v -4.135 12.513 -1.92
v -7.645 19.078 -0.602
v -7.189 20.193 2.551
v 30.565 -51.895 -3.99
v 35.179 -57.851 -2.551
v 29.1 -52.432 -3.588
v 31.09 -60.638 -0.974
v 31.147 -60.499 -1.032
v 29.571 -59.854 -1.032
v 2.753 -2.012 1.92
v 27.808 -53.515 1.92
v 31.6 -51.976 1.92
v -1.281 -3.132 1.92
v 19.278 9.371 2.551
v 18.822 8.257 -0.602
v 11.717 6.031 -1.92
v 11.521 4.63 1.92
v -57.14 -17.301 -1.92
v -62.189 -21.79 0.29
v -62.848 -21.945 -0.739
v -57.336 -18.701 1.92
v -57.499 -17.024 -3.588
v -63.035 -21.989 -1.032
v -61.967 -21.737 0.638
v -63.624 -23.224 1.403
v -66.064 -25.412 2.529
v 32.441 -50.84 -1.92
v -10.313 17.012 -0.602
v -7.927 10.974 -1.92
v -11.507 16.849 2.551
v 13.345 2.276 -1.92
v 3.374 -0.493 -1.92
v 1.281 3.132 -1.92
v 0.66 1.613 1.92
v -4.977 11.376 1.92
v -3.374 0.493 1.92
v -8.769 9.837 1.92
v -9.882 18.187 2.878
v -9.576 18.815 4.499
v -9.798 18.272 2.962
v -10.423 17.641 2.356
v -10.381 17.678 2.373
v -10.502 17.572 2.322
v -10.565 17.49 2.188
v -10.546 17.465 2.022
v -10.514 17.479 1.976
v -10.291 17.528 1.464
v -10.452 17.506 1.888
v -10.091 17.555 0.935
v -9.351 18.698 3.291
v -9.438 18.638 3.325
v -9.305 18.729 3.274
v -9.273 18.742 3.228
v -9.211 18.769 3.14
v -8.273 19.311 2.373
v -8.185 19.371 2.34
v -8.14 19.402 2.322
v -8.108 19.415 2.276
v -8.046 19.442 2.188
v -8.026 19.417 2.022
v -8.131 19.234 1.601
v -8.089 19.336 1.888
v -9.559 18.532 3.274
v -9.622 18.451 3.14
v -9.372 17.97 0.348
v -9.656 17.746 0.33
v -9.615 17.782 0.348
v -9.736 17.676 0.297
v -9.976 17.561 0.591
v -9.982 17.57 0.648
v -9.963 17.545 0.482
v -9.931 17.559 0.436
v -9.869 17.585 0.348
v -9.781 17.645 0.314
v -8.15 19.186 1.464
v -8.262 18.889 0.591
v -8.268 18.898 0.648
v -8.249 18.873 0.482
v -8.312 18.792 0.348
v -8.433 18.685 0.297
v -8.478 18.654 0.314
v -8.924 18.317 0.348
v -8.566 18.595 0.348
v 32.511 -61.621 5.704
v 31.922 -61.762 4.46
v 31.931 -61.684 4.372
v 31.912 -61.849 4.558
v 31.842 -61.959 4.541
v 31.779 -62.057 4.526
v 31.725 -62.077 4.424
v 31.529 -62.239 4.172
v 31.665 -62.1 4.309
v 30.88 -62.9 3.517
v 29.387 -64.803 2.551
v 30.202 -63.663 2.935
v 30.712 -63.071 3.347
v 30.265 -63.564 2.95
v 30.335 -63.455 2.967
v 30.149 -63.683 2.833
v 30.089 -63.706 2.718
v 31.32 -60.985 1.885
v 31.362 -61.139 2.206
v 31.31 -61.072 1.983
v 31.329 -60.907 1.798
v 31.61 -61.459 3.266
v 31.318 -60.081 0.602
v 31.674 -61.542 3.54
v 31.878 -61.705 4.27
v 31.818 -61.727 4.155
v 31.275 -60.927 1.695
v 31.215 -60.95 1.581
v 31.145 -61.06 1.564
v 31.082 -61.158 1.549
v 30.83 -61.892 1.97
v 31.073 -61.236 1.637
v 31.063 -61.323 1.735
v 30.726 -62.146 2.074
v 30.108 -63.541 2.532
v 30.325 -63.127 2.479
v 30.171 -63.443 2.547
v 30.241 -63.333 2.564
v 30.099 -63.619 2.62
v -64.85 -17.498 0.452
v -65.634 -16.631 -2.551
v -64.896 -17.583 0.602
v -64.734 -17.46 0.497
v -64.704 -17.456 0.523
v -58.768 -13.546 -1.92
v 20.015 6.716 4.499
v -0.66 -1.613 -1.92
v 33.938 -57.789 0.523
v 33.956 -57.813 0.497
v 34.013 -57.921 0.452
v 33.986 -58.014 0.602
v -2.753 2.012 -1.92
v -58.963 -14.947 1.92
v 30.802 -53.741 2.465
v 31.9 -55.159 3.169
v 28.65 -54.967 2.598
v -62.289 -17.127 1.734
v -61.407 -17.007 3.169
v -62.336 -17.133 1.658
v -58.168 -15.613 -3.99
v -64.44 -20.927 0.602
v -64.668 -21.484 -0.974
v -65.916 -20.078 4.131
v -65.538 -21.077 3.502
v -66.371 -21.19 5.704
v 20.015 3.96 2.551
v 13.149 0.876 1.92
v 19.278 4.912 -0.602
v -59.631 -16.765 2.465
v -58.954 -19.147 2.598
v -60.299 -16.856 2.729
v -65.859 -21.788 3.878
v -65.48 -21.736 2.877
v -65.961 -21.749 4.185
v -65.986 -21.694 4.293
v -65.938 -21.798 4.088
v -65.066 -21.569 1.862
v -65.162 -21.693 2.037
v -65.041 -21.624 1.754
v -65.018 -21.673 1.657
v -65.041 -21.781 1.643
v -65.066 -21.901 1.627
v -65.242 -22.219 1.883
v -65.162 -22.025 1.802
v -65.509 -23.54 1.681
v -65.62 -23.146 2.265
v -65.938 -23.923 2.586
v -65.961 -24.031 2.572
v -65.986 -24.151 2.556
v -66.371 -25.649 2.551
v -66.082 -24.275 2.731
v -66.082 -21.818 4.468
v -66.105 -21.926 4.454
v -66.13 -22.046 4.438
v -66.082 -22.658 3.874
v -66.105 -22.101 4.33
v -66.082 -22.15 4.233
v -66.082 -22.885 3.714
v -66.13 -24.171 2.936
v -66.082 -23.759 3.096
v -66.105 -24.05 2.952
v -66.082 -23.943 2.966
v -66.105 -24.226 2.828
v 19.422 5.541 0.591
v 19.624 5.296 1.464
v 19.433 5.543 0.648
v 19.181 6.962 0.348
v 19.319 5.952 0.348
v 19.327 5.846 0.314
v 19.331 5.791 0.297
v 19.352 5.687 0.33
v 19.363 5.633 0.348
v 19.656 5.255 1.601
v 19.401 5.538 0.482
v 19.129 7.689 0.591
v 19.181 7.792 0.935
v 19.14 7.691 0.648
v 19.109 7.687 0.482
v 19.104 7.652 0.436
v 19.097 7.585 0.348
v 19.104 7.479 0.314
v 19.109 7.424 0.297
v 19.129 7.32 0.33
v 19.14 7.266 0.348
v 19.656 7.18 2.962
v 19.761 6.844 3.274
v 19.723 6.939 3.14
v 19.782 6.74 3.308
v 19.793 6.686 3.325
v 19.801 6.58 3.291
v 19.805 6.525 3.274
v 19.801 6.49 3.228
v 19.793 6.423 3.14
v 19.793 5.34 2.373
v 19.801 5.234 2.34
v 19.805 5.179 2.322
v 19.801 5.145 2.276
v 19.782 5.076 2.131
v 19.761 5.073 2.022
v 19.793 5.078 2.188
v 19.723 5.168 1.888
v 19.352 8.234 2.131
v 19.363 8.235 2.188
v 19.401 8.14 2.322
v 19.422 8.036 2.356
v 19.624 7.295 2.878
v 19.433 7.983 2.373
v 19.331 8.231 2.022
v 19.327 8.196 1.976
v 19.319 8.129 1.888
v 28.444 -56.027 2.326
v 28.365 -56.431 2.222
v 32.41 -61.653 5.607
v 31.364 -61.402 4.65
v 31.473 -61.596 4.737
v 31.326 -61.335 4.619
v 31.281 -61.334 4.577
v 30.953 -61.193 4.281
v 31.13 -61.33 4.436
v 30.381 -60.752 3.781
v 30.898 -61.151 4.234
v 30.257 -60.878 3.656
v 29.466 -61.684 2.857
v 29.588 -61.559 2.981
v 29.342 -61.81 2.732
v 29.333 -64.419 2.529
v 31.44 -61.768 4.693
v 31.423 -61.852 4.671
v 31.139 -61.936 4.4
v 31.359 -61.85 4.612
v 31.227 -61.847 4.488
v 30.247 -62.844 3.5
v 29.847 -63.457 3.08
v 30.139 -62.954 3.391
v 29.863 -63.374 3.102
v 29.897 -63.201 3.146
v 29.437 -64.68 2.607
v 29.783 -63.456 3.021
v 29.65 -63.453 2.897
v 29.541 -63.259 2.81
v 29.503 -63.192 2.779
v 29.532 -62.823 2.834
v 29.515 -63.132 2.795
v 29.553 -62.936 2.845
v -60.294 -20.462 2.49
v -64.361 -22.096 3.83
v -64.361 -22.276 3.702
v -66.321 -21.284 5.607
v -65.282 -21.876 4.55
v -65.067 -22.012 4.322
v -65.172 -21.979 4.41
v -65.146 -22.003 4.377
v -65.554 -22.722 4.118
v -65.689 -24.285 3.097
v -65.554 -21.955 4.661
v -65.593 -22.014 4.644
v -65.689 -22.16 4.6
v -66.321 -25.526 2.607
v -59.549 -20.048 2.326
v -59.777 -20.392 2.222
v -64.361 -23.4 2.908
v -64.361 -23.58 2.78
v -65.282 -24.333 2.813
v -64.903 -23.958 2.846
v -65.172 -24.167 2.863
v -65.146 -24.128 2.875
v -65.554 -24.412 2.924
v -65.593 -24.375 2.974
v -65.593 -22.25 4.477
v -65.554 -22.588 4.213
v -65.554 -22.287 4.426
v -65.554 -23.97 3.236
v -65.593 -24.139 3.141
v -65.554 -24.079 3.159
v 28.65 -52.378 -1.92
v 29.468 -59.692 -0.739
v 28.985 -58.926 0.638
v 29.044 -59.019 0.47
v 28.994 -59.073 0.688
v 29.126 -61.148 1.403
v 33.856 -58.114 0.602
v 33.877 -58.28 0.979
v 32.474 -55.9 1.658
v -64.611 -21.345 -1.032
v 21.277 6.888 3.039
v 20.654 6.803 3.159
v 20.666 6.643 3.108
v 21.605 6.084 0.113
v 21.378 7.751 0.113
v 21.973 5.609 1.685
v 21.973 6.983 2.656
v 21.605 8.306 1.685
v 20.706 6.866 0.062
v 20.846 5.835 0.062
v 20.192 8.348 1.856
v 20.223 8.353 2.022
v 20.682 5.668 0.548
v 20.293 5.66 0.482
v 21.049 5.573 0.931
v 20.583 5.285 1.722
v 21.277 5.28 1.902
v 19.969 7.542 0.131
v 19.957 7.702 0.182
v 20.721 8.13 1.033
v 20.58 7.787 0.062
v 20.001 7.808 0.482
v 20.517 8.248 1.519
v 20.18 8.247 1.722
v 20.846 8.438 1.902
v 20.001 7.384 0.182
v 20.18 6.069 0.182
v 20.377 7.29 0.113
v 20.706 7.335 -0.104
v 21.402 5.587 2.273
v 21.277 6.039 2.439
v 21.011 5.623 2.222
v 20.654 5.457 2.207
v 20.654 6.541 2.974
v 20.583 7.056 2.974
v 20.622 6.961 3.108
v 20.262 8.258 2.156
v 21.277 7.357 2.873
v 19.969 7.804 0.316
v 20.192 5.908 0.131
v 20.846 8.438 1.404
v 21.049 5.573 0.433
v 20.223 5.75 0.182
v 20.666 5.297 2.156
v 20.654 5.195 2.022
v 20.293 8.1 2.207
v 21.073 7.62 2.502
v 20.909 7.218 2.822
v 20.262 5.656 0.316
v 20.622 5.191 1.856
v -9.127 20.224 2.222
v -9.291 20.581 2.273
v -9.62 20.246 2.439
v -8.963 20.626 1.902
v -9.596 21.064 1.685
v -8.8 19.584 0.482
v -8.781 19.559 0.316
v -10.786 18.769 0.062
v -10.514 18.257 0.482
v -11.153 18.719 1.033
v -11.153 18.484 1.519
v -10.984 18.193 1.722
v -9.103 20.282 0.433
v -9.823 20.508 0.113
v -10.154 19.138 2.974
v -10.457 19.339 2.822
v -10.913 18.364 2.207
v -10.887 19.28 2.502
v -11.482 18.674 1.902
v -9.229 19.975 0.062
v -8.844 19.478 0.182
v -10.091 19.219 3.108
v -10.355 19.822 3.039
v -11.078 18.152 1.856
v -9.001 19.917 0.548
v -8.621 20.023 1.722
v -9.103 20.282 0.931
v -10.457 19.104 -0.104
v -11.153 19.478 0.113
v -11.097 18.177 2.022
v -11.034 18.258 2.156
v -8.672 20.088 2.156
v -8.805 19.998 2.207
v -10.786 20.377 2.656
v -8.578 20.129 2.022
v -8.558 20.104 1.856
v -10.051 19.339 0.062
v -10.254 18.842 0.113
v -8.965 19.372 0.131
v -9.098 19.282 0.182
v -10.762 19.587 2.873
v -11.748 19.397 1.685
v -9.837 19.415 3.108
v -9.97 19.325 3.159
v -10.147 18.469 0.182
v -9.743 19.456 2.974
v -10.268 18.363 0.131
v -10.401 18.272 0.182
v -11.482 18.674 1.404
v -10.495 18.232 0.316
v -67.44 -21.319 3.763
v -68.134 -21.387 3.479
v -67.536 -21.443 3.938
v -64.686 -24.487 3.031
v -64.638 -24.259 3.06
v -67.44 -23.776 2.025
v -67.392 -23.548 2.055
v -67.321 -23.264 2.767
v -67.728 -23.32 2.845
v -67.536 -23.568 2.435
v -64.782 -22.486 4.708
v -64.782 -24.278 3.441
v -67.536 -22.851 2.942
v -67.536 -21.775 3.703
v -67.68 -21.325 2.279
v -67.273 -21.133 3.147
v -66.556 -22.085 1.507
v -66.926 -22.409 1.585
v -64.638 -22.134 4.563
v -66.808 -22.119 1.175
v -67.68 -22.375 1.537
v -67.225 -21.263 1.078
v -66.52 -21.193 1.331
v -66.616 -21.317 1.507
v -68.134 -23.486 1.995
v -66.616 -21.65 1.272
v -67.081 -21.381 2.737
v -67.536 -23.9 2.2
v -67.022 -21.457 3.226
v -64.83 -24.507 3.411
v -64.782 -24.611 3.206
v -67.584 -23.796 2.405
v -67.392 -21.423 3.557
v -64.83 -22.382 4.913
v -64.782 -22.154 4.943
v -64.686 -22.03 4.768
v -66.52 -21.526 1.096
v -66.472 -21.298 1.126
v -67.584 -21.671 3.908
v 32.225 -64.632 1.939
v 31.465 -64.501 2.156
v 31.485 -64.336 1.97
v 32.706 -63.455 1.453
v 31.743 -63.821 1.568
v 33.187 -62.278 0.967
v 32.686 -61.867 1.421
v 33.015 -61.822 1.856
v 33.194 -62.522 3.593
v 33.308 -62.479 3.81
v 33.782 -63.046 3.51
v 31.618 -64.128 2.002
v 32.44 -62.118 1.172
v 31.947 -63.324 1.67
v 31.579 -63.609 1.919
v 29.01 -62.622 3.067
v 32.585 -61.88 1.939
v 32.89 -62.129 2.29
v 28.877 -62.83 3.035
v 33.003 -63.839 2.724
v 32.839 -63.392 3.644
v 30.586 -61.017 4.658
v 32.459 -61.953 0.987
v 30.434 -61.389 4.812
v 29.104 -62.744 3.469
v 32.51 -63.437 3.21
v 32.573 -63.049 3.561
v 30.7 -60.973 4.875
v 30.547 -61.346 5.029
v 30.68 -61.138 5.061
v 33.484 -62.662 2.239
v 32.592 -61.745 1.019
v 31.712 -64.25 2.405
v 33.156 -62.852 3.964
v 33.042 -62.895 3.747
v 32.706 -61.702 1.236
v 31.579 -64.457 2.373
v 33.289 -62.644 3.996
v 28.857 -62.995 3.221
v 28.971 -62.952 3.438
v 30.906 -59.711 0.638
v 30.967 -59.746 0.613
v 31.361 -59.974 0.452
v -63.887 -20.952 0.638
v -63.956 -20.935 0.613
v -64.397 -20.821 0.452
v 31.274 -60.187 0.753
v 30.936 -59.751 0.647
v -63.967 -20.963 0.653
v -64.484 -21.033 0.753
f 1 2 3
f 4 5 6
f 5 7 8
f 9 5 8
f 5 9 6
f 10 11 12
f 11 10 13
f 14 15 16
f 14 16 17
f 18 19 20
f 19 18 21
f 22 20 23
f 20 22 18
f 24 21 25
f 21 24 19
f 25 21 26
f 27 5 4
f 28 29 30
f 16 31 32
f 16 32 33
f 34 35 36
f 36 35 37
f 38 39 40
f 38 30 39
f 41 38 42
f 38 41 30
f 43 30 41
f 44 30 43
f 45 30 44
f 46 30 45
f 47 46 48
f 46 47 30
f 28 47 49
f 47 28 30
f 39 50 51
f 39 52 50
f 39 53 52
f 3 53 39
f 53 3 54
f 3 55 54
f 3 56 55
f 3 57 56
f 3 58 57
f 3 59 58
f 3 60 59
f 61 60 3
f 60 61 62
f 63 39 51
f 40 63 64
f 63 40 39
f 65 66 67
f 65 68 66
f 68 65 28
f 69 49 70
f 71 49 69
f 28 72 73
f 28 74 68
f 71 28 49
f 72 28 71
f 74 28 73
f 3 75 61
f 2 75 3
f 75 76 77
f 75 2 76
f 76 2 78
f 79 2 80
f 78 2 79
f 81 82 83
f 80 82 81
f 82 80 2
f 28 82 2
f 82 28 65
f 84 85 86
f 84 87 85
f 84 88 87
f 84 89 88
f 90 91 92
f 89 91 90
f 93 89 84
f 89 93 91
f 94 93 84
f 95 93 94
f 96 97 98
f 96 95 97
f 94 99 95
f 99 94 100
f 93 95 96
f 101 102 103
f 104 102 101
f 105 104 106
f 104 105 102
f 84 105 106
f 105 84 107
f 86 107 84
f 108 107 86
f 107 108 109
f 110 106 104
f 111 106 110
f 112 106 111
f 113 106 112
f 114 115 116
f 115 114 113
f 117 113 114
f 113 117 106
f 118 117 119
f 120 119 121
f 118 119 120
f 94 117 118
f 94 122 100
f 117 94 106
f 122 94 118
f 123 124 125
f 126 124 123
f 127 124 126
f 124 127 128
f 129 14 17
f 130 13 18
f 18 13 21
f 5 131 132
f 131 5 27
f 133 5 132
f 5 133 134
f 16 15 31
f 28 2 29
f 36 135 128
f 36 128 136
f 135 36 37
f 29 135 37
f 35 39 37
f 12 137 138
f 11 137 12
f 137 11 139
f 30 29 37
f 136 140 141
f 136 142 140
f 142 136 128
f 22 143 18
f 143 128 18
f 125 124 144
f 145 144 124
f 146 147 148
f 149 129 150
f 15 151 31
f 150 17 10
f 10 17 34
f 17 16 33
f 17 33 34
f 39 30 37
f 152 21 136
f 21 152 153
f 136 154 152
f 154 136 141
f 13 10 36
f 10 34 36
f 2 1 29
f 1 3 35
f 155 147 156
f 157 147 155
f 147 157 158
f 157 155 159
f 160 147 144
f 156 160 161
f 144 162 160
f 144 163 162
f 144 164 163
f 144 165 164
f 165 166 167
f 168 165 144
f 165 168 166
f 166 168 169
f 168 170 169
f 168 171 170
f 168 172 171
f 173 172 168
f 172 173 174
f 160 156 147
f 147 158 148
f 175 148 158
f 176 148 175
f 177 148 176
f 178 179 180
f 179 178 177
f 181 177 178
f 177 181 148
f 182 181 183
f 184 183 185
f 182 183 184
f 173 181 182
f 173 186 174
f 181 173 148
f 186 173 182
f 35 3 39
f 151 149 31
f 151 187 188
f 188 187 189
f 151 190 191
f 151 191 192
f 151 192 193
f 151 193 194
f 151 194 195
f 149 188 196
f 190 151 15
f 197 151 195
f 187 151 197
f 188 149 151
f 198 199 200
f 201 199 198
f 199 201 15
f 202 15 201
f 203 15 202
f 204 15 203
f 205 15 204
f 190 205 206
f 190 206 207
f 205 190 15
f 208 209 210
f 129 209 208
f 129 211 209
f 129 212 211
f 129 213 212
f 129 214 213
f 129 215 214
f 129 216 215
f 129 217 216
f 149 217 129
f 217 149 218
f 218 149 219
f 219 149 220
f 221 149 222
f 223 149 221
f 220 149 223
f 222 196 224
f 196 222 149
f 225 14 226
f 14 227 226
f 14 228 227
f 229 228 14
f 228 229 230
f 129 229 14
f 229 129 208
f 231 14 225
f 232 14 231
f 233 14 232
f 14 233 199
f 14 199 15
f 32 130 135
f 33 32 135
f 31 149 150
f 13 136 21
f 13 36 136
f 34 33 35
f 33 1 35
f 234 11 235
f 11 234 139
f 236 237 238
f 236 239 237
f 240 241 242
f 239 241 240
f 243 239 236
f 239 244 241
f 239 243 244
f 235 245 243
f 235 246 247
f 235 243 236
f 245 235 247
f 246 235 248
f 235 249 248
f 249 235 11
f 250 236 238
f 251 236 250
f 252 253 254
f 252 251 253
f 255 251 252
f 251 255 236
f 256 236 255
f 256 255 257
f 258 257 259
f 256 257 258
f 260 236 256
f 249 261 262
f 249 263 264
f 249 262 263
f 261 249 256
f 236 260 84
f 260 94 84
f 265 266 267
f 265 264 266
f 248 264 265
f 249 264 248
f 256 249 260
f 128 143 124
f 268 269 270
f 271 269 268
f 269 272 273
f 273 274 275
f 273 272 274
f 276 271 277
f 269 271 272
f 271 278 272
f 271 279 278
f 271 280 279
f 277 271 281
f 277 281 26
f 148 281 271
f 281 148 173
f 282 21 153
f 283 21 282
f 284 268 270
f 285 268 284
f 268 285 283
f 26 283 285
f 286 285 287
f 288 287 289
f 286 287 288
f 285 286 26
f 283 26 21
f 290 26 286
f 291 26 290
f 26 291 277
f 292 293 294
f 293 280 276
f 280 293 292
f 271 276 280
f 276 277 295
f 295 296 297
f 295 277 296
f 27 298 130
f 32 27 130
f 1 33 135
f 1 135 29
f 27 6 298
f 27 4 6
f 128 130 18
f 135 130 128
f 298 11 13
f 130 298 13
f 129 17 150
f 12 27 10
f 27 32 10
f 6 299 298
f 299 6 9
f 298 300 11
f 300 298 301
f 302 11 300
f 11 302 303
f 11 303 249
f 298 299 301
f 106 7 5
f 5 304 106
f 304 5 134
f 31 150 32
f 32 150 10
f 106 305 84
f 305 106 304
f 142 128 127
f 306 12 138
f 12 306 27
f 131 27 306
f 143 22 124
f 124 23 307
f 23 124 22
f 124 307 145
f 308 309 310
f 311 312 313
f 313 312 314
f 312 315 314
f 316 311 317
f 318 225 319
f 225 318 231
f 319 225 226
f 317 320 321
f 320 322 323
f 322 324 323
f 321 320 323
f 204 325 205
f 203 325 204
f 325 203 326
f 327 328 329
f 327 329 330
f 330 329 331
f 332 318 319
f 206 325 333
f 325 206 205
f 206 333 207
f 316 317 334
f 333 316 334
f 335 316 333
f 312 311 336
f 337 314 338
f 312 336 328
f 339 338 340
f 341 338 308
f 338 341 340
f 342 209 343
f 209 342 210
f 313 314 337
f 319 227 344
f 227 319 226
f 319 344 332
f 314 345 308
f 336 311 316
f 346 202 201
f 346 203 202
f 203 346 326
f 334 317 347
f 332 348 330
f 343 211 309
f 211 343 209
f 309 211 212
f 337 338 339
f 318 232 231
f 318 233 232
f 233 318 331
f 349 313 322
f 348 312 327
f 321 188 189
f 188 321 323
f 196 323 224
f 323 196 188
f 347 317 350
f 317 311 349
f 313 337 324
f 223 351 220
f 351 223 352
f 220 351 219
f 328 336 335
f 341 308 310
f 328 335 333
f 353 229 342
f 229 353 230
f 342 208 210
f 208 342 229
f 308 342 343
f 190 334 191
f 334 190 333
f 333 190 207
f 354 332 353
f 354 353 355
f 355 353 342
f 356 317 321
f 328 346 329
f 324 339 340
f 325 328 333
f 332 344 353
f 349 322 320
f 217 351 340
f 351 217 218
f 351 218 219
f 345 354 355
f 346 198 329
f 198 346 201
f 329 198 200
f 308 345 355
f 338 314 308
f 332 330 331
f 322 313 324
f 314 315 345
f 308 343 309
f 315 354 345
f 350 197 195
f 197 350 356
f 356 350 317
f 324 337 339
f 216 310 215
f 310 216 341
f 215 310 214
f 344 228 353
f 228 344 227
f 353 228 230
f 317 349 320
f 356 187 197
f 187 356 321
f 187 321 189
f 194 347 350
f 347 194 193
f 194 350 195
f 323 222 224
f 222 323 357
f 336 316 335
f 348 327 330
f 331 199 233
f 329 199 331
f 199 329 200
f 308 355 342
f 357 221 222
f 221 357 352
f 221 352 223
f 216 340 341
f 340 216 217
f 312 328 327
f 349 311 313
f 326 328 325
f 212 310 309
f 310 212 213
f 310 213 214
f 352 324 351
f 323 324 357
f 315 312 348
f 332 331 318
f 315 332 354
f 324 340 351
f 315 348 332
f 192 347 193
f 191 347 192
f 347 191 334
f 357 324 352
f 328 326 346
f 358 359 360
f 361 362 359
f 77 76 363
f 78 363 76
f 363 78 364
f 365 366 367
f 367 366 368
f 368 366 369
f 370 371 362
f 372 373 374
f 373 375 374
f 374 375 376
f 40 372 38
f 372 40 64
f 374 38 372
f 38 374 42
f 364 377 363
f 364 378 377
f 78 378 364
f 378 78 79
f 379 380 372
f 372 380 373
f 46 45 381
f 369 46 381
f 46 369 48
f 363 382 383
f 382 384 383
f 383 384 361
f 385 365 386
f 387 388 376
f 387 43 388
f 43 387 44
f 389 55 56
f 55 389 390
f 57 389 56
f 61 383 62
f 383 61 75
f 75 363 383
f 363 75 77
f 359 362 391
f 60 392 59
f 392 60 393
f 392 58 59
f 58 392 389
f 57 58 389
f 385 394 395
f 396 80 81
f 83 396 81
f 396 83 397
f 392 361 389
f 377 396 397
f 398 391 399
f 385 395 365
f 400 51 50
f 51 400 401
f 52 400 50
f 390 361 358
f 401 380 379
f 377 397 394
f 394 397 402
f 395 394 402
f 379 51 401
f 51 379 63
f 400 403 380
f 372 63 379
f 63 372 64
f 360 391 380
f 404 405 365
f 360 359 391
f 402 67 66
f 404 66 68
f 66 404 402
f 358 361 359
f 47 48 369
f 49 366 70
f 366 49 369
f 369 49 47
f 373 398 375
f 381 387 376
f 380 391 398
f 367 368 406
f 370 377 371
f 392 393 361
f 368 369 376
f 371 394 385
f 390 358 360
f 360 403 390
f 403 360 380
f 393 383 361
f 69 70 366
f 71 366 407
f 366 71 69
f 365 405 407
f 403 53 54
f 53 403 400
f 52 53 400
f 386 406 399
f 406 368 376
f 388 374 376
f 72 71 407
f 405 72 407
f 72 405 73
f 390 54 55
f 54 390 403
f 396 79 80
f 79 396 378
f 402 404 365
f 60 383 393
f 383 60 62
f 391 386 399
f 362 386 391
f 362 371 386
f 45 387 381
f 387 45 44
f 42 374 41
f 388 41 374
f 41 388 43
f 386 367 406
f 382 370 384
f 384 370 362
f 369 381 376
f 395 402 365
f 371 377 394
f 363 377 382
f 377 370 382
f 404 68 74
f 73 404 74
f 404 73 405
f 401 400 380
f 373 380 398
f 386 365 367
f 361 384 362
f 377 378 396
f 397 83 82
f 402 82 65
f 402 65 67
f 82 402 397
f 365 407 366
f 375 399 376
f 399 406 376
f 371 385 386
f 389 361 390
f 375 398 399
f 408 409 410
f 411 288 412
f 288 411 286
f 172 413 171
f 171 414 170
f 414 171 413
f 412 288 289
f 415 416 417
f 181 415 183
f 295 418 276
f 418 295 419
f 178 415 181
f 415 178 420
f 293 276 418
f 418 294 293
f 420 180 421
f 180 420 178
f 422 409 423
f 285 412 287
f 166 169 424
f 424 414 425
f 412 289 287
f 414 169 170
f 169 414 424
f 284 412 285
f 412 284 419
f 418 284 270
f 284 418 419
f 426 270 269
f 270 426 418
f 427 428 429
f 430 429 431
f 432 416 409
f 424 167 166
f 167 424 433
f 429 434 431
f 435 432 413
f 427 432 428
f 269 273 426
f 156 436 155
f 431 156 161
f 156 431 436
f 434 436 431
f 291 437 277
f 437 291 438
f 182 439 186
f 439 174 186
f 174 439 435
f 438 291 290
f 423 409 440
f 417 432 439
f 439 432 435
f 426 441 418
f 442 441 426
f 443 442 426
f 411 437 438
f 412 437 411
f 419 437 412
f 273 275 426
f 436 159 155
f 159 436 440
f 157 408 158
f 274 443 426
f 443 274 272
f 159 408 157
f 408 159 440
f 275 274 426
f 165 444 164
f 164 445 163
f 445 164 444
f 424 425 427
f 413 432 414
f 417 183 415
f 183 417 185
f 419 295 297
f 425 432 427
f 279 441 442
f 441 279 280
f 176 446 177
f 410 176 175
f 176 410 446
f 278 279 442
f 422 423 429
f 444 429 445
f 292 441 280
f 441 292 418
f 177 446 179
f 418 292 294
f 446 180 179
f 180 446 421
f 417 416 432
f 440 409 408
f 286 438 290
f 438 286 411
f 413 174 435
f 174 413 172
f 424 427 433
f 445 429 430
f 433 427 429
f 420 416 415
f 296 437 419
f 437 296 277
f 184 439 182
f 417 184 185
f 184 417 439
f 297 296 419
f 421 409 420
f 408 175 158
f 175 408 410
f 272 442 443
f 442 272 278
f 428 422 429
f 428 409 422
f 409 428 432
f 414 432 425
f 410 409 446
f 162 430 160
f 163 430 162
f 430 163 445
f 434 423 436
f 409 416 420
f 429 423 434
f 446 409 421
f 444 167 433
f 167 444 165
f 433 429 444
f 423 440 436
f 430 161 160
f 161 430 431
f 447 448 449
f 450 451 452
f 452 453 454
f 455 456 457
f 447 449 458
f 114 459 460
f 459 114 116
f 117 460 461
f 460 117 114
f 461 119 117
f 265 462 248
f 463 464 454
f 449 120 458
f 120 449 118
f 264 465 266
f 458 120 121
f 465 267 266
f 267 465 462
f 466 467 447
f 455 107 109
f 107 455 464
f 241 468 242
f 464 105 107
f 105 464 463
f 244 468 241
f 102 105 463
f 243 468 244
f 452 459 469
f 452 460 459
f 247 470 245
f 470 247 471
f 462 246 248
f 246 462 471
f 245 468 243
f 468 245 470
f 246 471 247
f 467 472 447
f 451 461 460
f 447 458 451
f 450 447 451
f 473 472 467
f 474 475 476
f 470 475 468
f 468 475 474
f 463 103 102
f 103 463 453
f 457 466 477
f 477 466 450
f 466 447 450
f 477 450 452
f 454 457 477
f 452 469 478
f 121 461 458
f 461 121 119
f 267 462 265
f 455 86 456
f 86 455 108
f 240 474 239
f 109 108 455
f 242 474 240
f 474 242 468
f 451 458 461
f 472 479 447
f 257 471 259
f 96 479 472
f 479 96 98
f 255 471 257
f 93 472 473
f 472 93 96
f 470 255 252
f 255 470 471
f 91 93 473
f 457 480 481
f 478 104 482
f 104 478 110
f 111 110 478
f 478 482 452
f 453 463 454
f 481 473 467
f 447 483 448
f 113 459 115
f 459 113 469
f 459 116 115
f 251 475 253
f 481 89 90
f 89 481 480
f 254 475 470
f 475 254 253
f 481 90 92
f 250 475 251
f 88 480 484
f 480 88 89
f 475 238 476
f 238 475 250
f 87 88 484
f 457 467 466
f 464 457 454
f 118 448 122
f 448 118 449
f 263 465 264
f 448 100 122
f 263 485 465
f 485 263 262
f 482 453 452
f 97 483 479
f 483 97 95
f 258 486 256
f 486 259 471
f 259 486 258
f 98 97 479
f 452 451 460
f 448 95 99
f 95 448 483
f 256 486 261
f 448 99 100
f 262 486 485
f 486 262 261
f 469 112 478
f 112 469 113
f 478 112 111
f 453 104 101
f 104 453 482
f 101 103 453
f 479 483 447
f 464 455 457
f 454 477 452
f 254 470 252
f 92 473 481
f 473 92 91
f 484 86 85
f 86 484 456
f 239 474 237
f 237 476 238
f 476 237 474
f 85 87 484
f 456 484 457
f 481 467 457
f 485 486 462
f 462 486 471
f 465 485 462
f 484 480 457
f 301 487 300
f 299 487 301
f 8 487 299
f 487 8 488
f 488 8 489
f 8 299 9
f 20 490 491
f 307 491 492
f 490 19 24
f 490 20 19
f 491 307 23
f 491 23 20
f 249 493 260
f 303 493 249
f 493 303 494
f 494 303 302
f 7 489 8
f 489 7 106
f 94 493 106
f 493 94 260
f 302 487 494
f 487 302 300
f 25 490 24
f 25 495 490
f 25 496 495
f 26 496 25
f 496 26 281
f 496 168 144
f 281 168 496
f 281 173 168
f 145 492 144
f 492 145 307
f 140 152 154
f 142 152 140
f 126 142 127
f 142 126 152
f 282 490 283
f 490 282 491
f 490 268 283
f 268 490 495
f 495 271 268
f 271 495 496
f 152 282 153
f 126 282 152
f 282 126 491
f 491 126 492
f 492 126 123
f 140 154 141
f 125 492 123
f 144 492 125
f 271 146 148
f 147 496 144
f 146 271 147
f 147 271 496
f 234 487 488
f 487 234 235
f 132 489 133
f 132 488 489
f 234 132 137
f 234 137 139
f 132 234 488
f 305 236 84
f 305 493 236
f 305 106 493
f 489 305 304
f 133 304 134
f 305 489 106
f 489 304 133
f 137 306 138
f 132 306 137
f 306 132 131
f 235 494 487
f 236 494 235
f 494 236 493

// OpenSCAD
sc=(4+2*sqrt(5))/cos(16.5);
points=[[ -6.683305, -4.156589, 1.968962 ], [ -6.681356, -3.948404, 1.585410 ], [ -6.681356, -3.948404, 2.203444 ], [ -6.667950, -4.236989, 1.748982 ], [ -6.667950, -4.236989, 1.894427 ], [ -6.667950, -4.236989, 2.039872 ], [ -6.665018, -4.151844, 1.747170 ], [ -6.665018, -4.151844, 2.041685 ], [ -6.663119, -3.959675, 1.585410 ], [ -6.663119, -3.959675, 2.203444 ], [ -6.652595, -4.156589, 1.724137 ], [ -6.652595, -4.156589, 1.770202 ], [ -6.652595, -4.156589, 1.919272 ], [ -6.652595, -4.156589, 2.018652 ], [ -6.652595, -4.156589, 2.064717 ], [ -6.643106, -4.131744, 1.968962 ], [ -6.627750, -4.166079, 1.724137 ], [ -6.627750, -4.166079, 2.064717 ], [ -6.615328, -4.170824, 1.747170 ], [ -6.615328, -4.170824, 2.041685 ], [ -6.565638, -4.201534, 1.747170 ], [ -6.565638, -4.161334, 1.772015 ], [ -6.556356, -4.150658, 1.258156 ], [ -6.556356, -4.150658, 2.530698 ], [ -6.550283, -4.281934, 1.821705 ], [ -6.550283, -4.281934, 1.967150 ], [ -6.543210, -3.832946, 1.747170 ], [ -6.543210, -3.832946, 2.041685 ], [ -6.534928, -4.201534, 1.796860 ], [ -6.530787, -3.837691, 1.724137 ], [ -6.530787, -3.837691, 1.770202 ], [ -6.530787, -3.837691, 2.018652 ], [ -6.530787, -3.837691, 2.064717 ], [ -6.505942, -3.847181, 1.724137 ], [ -6.505942, -3.847181, 2.064717 ], [ -6.494728, -4.216889, 1.967150 ], [ -6.493520, -3.851926, 1.747170 ], [ -6.493520, -3.851926, 2.041685 ], [ -6.445038, -4.247599, 1.967150 ], [ -6.445038, -4.207399, 1.942305 ], [ -6.432616, -4.326879, 1.894427 ], [ -6.414328, -4.247599, 1.871395 ], [ -6.414328, -4.247599, 1.917460 ], [ -6.389483, -4.257089, 1.871395 ], [ -6.389483, -4.257089, 1.917460 ], [ -6.377061, -4.261834, 1.894427 ], [ -6.292520, -3.928701, 1.871395 ], [ -6.292520, -3.928701, 1.917460 ], [ -6.291035, -3.943685, 2.077546 ], [ -6.279551, -4.827211, 1.819617 ], [ -6.267675, -3.938191, 1.871395 ], [ -6.267675, -3.938191, 1.917460 ], [ -6.255252, -3.942936, 1.894427 ], [ -6.226119, -5.202624, 1.390773 ], [ -6.190202, -4.106837, 2.167923 ], [ -6.163119, -4.150658, 1.894427 ], [ -6.151848, -4.150658, 1.876190 ], [ -6.151848, -4.150658, 1.912664 ], [ -6.045085, -4.341641, 1.585410 ], [ -6.026848, -4.352912, 1.585410 ], [ -6.026848, -4.352912, 2.203444 ], [ -5.854102, -4.650658, 1.703444 ], [ -5.807415, -5.299347, 2.291753 ], [ -5.753983, -5.674760, 1.862909 ], [ -5.577844, -3.598800, 1.602651 ], [ -5.534617, -3.902515, 1.255708 ], [ -5.246536, -3.898800, 1.724129 ], [ -5.203309, -4.202515, 1.377186 ], [ -5.153518, -4.049306, 1.807501 ], [ -5.115633, -4.194259, 1.703444 ], [ -3.254305, 1.596681, -0.532624 ], [ -3.129305, 1.394427, -0.859878 ], [ -2.754305, 2.405698, -0.223607 ], [ -2.724797, 1.394427, -0.205370 ], [ -2.599797, 1.192173, -0.532624 ], [ -2.427051, 1.876190, -0.021353 ], [ -2.427051, 2.530698, -0.425861 ], [ -2.099797, 2.001190, -0.223607 ], [ -0.827254, 5.523732, 5.821478 ], [ -0.814757, 5.451586, 5.592459 ], [ -0.811652, 5.430300, 5.610640 ], [ -0.809017, 5.512461, 5.821478 ], [ -0.796577, 5.454692, 5.571173 ], [ -0.790365, 5.412119, 5.607534 ], [ -0.772185, 5.415225, 5.586248 ], [ -0.718376, 5.607534, 5.340130 ], [ -0.715270, 5.586248, 5.358310 ], [ -0.702254, 5.321478, 6.148732 ], [ -0.700196, 5.610640, 5.318843 ], [ -0.678909, 5.592459, 5.315738 ], [ -0.675804, 5.571173, 5.333918 ], [ -0.636271, 5.832749, 5.321478 ], [ -0.618034, 5.821478, 5.321478 ], [ -0.606036, 5.660307, 5.801180 ], [ -0.602930, 5.639021, 5.819361 ], [ -0.597006, 5.269447, 5.596649 ], [ -0.587855, 5.663413, 5.779894 ], [ -0.581644, 5.620841, 5.816255 ], [ -0.563463, 5.623946, 5.794969 ], [ -0.559322, 5.333918, 5.454692 ], [ -0.544247, 5.358310, 5.415225 ], [ -0.539071, 5.742347, 5.652177 ], [ -0.539071, 5.752397, 5.593343 ], [ -0.539071, 5.794969, 5.619654 ], [ -0.538036, 5.315738, 5.451586 ], [ -0.537152, 5.591424, 5.752397 ], [ -0.534046, 5.691644, 5.845672 ], [ -0.522961, 5.340130, 5.412119 ], [ -0.519856, 5.318843, 5.430300 ], [ -0.510841, 5.591424, 5.794969 ], [ -0.509655, 5.816255, 5.548851 ], [ -0.506549, 5.794969, 5.567032 ], [ -0.491474, 5.819361, 5.527565 ], [ -0.486449, 5.768658, 5.721061 ], [ -0.478318, 5.591424, 5.742347 ], [ -0.470188, 5.801180, 5.524459 ], [ -0.467082, 5.779894, 5.542640 ], [ -0.447214, 0.447214, -0.447214 ], [ -0.442525, 5.193099, 5.720182 ], [ -0.438851, 5.845672, 5.596449 ], [ -0.409435, 5.644046, 5.768658 ], [ -0.388148, 5.652177, 5.591424 ], [ -0.378098, 5.593343, 5.591424 ], [ -0.372678, -1.030766, -1.034481 ], [ -0.372678, -0.167301, -0.171017 ], [ -0.372678, 0.167694, 0.163978 ], [ -0.372678, 4.823336, 4.819621 ], [ -0.361837, 5.721061, 5.644046 ], [ -0.350601, 5.542640, 5.663413 ], [ -0.335526, 5.567032, 5.623946 ], [ -0.335526, 5.619654, 5.591424 ], [ -0.329315, 5.524459, 5.660307 ], [ -0.314240, 5.548851, 5.620841 ], [ -0.311134, 5.527565, 5.639021 ], [ -0.309017, -1.532624, -1.723607 ], [ -0.309017, 5.303241, 5.523732 ], [ -0.309017, 5.321478, 5.512461 ], [ -0.309017, 5.957749, 5.119224 ], [ -0.297746, 5.321478, 5.494224 ], [ -0.284823, 5.596449, 5.691644 ], [ -0.190983, -1.341641, -2.032624 ], [ -0.180340, -1.657400, -1.849873 ], [ -0.180340, -1.595788, -1.811795 ], [ -0.180340, -1.585738, -1.828056 ], [ -0.180340, -1.346564, -1.657766 ], [ -0.180340, -1.336514, -1.674027 ], [ -0.172746, 5.119224, 5.821478 ], [ -0.169104, -1.603919, -1.798639 ], [ -0.169104, -1.577607, -1.841212 ], [ -0.169104, -1.354695, -1.644610 ], [ -0.169104, -1.328384, -1.687183 ], [ -0.154029, -1.726283, -1.902495 ], [ -0.150923, -1.607024, -1.793614 ], [ -0.150923, -1.357801, -1.639585 ], [ -0.147817, -1.689922, -1.817350 ], [ -0.143979, -1.598566, -1.945068 ], [ -0.143979, -1.578466, -1.997690 ], [ -0.137767, -1.647350, -1.807300 ], [ -0.127717, -1.545943, -1.971379 ], [ -0.122692, -1.502512, -1.962718 ], [ -0.122692, -1.492463, -1.978979 ], [ -0.122692, -1.253289, -1.808689 ], [ -0.122692, -1.243239, -1.824950 ], [ -0.111456, -1.545943, -2.030213 ], [ -0.111456, -1.484332, -1.992135 ], [ -0.111456, -1.235108, -1.838106 ], [ -0.095195, -1.689922, -1.797250 ], [ -0.095195, -1.631088, -2.056524 ], [ -0.093276, -1.481226, -1.997160 ], [ -0.093276, -1.232003, -1.843131 ], [ -0.075095, -1.484332, -1.992135 ], [ -0.075095, -1.235108, -1.838106 ], [ -0.029417, -1.653436, -1.718519 ], [ -0.029417, -1.404212, -1.564491 ], [ -0.018181, -1.661566, -1.705364 ], [ -0.018181, -1.412343, -1.551335 ], [ -0.001858, -1.266834, -0.888583 ], [ -0.001858, -0.438710, -0.060459 ], [ -0.001858, -0.103715, 0.274536 ], [ -0.001858, 4.587268, 4.965519 ], [ 0.000000, -1.785117, -1.807300 ], [ 0.000000, -1.726283, -1.738417 ], [ 0.000000, -1.664672, -1.700339 ], [ 0.000000, -1.650658, -1.532624 ], [ 0.000000, -1.415448, -1.546310 ], [ 0.000000, 0.000000, 0.000000 ], [ 0.000000, 5.439512, 5.321478 ], [ 0.001858, -0.798413, -1.176664 ], [ 0.001858, 0.103715, -0.274536 ], [ 0.001858, 0.438710, 0.060459 ], [ 0.001858, 5.055689, 4.677438 ], [ 0.006211, -1.545943, -2.030213 ], [ 0.018181, -1.661566, -1.705364 ], [ 0.018181, -1.412343, -1.551335 ], [ 0.018237, 5.428241, 5.321478 ], [ 0.029417, -1.653436, -1.718519 ], [ 0.029417, -1.404212, -1.564491 ], [ 0.042572, -1.683711, -1.748467 ], [ 0.052622, -1.726283, -1.758517 ], [ 0.058834, -1.545943, -2.050313 ], [ 0.058834, -1.519632, -2.013951 ], [ 0.075095, -1.484332, -1.992135 ], [ 0.075095, -1.235108, -1.838106 ], [ 0.085145, -1.693761, -1.791039 ], [ 0.093276, -1.481226, -1.997160 ], [ 0.093276, -1.232003, -1.843131 ], [ 0.095195, -1.631088, -2.056524 ], [ 0.111456, -1.545943, -2.030213 ], [ 0.111456, -1.484332, -1.992135 ], [ 0.111456, -1.235108, -1.838106 ], [ 0.122692, -1.502512, -1.962718 ], [ 0.122692, -1.492463, -1.978979 ], [ 0.122692, -1.253289, -1.808689 ], [ 0.122692, -1.243239, -1.824950 ], [ 0.140649, 4.516838, 5.079477 ], [ 0.147817, -1.604777, -1.935018 ], [ 0.150923, -1.607024, -1.793614 ], [ 0.150923, -1.357801, -1.639585 ], [ 0.154029, -1.726283, -1.902495 ], [ 0.164079, -1.604777, -1.876184 ], [ 0.169104, -1.603919, -1.798639 ], [ 0.169104, -1.577607, -1.841212 ], [ 0.169104, -1.354695, -1.644610 ], [ 0.169104, -1.328384, -1.687183 ], [ 0.180340, -1.657400, -1.849873 ], [ 0.180340, -1.637300, -1.902495 ], [ 0.180340, -1.595788, -1.811795 ], [ 0.180340, -1.585738, -1.828056 ], [ 0.180340, -1.346564, -1.657766 ], [ 0.180340, -1.336514, -1.674027 ], [ 0.190983, -1.341641, -2.032624 ], [ 0.203228, -1.573922, -1.409873 ], [ 0.203228, 5.662146, 5.826195 ], [ 0.309017, -1.532624, -1.723607 ], [ 0.309017, 4.583009, 5.056062 ], [ 0.309017, 5.321478, 5.512461 ], [ 0.372678, -1.034481, -1.030766 ], [ 0.372678, -0.167694, -0.163978 ], [ 0.372678, 0.167301, 0.171017 ], [ 0.372678, 4.819621, 4.823336 ], [ 0.666179, -1.286719, -1.585621 ], [ 0.666179, 5.949349, 5.650447 ], [ 0.675364, -2.046058, -0.937737 ], [ 0.675364, 5.190010, 6.298331 ], [ 0.967241, 1.137268, -0.206366 ], [ 1.010468, 0.833553, -0.553309 ], [ 1.138315, -1.758855, -1.113485 ], [ 1.138315, 5.477213, 6.122583 ], [ 1.298549, 0.837268, -0.084888 ], [ 1.341776, 0.533553, -0.431831 ], [ 1.508396, 1.395917, -0.816882 ], [ 1.508396, 1.395917, -0.630331 ], [ 1.511501, 1.390892, -0.835063 ], [ 1.511501, 1.390892, -0.798702 ], [ 1.511501, 1.390892, -0.648512 ], [ 1.511501, 1.390892, -0.612151 ], [ 1.519632, 1.377737, -0.846299 ], [ 1.519632, 1.377737, -0.600914 ], [ 1.529682, 1.361476, -0.846299 ], [ 1.529682, 1.361476, -0.600914 ], [ 1.604777, 1.239969, -0.892710 ], [ 1.604777, 1.239969, -0.554503 ], [ 1.612908, 1.226814, -0.903947 ], [ 1.612908, 1.226814, -0.543267 ], [ 1.618034, 1.585410, -0.914590 ], [ 1.618034, 1.585410, -0.532624 ], [ 1.622958, 1.210552, -0.903947 ], [ 1.622958, 1.210552, -0.543267 ], [ 1.631088, 1.197397, -0.892710 ], [ 1.631088, 1.197397, -0.554503 ], [ 1.634194, 1.192372, -0.874530 ], [ 1.634194, 1.192372, -0.572684 ], [ 1.680605, 1.117277, -0.753024 ], [ 1.680605, 1.117277, -0.694190 ], [ 1.688736, 1.104121, -0.741787 ], [ 1.688736, 1.104121, -0.705426 ], [ 1.691841, 1.099096, -0.723607 ], [ 1.757619, 1.549946, -0.816882 ], [ 1.757619, 1.549946, -0.630331 ], [ 1.760725, 1.544921, -0.835063 ], [ 1.760725, 1.544921, -0.798702 ], [ 1.760725, 1.544921, -0.648512 ], [ 1.760725, 1.544921, -0.612151 ], [ 1.768856, 1.531765, -0.846299 ], [ 1.768856, 1.531765, -0.600914 ], [ 1.778906, 1.515504, -0.846299 ], [ 1.778906, 1.515504, -0.600914 ], [ 1.796025, 1.566738, -0.664773 ], [ 1.809017, 1.276393, -1.032624 ], [ 1.809017, 1.276393, -0.414590 ], [ 1.810619, 1.026891, -0.416451 ], [ 1.822337, 1.524165, -0.851324 ], [ 1.822337, 1.582999, -0.835063 ], [ 1.822337, 1.582999, -0.717396 ], [ 1.822337, 1.582999, -0.612151 ], [ 1.822337, 1.603099, -0.664773 ], [ 1.854001, 1.393998, -0.892710 ], [ 1.854001, 1.393998, -0.554503 ], [ 1.854859, 1.550477, -0.867585 ], [ 1.862131, 1.380842, -0.903947 ], [ 1.862131, 1.380842, -0.543267 ], [ 1.864050, 0.651478, -0.845295 ], [ 1.872181, 1.364581, -0.903947 ], [ 1.872181, 1.364581, -0.543267 ], [ 1.874959, 1.497854, -0.867585 ], [ 1.880312, 1.351426, -0.892710 ], [ 1.880312, 1.351426, -0.554503 ], [ 1.881170, 1.428970, -0.559528 ], [ 1.881170, 1.487804, -0.575789 ], [ 1.883418, 1.346401, -0.874530 ], [ 1.883418, 1.346401, -0.572684 ], [ 1.907481, 1.609310, -0.818802 ], [ 1.907481, 1.609310, -0.628412 ], [ 1.913693, 1.455282, -0.543267 ], [ 1.923743, 1.360087, -0.861374 ], [ 1.927051, 1.085410, -0.723607 ], [ 1.929829, 1.271306, -0.753024 ], [ 1.929829, 1.271306, -0.694190 ], [ 1.933793, 1.402659, -0.903947 ], [ 1.933793, 1.402659, -0.543267 ], [ 1.937959, 1.258150, -0.741787 ], [ 1.937959, 1.258150, -0.705426 ], [ 1.941065, 1.253125, -0.723607 ], [ 1.960104, 1.301253, -0.681034 ], [ 1.966315, 1.350037, -0.818802 ], [ 1.966315, 1.370137, -0.871424 ], [ 1.970154, 1.343825, -0.638462 ], [ 2.002676, 1.291203, -0.723607 ], [ 2.002676, 1.311303, -0.670984 ], [ 2.002676, 1.455282, -0.877635 ], [ 2.002676, 1.455282, -0.569578 ], [ 2.061510, 1.360087, -0.723607 ], [ 2.282754, 0.554755, 0.055685 ], [ 2.336186, 0.179342, -0.373159 ]];

X=-1;
Y=1;
Z=-1;
R=sqrt(X*X+Y*Y);
rotate ([atan2(R,Z),0,0]) rotate ([0,0,atan2(X,Y)]) scale(sc) difference() {
    render() {
polyhedron(points,faces=[[ 233, 236, 230 ],[ 234, 214, 118, 235 ],[ 125, 189, 190, 126 ],[ 288, 249, 315 ],[ 245, 249, 288 ],[ 9, 64, 66, 68, 54, 48 ],[ 234, 235, 239 ],[ 176, 183, 134 ],[ 248, 249, 237, 238 ],[ 188, 124, 123, 187 ],[ 140, 134, 183, 233, 230 ],[ 81, 92, 136 ],[ 61, 67, 58 ],[ 264, 245, 288 ],[ 66, 64, 125, 178 ],[ 235, 186, 239 ],[ 315, 249, 248 ],[ 95, 81, 136 ],[ 183, 176, 233 ],[ 65, 67, 177, 124 ],[ 177, 176, 123, 124 ],[ 187, 123, 140 ],[ 190, 92, 126 ],[ 134, 123, 176 ],[ 8, 67, 65 ],[ 69, 68, 66, 67 ],[ 48, 54, 61, 58, 55 ],[ 8, 55, 58 ],[ 244, 264, 265 ],[ 289, 315, 248 ],[ 244, 189, 188, 245 ],[ 237, 249, 245, 188 ],[ 123, 134, 140 ],[ 65, 64, 8 ],[ 189, 125, 124, 188 ],[ 176, 236, 233 ],[ 236, 187, 230 ],[ 8, 9, 55 ],[ 230, 187, 140 ],[ 289, 248, 265 ],[ 289, 265, 264, 288, 315 ],[ 238, 237, 177, 178 ],[ 248, 244, 265 ],[ 64, 65, 124, 125 ],[ 236, 237, 188, 187 ],[ 92, 81, 126 ],[ 61, 69, 67 ],[ 8, 64, 9 ],[ 179, 239, 238, 178 ],[ 237, 236, 176, 177 ],[ 179, 214, 234, 239 ],[ 67, 66, 178, 177 ],[ 178, 125, 126, 179 ],[ 244, 245, 264 ],[ 239, 190, 189, 238 ],[ 118, 214, 179, 126, 81, 95 ],[ 186, 235, 118, 95, 136 ],[ 248, 238, 189, 244 ],[ 92, 186, 136 ],[ 58, 67, 8 ],[ 92, 190, 239 ],[ 239, 186, 92 ],[ 9, 48, 55 ],[ 61, 54, 68, 69 ]]);
polyhedron(points,faces=[[ 292, 277, 279 ],[ 311, 329, 331, 330, 312 ],[ 319, 330, 326 ],[ 318, 299, 302 ],[ 305, 302, 266, 268 ],[ 307, 319, 297 ],[ 308, 307, 297, 286, 294 ],[ 321, 322, 276, 275 ],[ 324, 314, 309, 316, 327 ],[ 318, 302, 305 ],[ 317, 321, 275, 273 ],[ 254, 251, 255, 257, 259, 261, 263, 267, 269, 271, 273, 275, 276, 274, 272, 270, 268, 266, 262, 260, 258, 256, 252, 250, 253 ],[ 326, 323, 317, 310, 319 ],[ 328, 330, 331 ],[ 293, 311, 295 ],[ 331, 327, 328 ],[ 293, 287, 281, 280, 292 ],[ 285, 283, 256, 258 ],[ 295, 311, 312 ],[ 302, 299, 262, 266 ],[ 311, 292, 298 ],[ 326, 330, 328 ],[ 322, 320, 274, 276 ],[ 319, 310, 306 ],[ 325, 318, 314 ],[ 283, 279, 252, 256 ],[ 287, 293, 295 ],[ 309, 305, 268, 270 ],[ 308, 312, 313 ],[ 324, 331, 325 ],[ 286, 297, 261, 259 ],[ 319, 306, 303 ],[ 330, 319, 313 ],[ 312, 294, 295 ],[ 278, 282, 255, 251 ],[ 328, 327, 323 ],[ 292, 280, 277 ],[ 323, 327, 317 ],[ 296, 285, 258, 260 ],[ 292, 283, 285 ],[ 310, 317, 273, 271 ],[ 304, 291, 285, 296, 318 ],[ 319, 300, 297 ],[ 327, 316, 320 ],[ 287, 294, 281 ],[ 327, 321, 317 ],[ 318, 296, 299 ],[ 307, 308, 313 ],[ 281, 278, 251, 254 ],[ 291, 304, 298 ],[ 320, 316, 272, 274 ],[ 298, 292, 291 ],[ 292, 311, 293 ],[ 314, 318, 309 ],[ 294, 312, 308 ],[ 298, 329, 311 ],[ 292, 279, 283 ],[ 304, 329, 298 ],[ 300, 303, 267, 263 ],[ 295, 294, 287 ],[ 277, 280, 253, 250 ],[ 299, 296, 260, 262 ],[ 313, 319, 307 ],[ 297, 300, 263, 261 ],[ 303, 306, 269, 267 ],[ 284, 286, 259, 257 ],[ 323, 326, 328 ],[ 314, 324, 325 ],[ 316, 309, 270, 272 ],[ 291, 292, 285 ],[ 319, 303, 300 ],[ 282, 284, 257, 255 ],[ 280, 281, 254, 253 ],[ 327, 331, 324 ],[ 313, 312, 330 ],[ 327, 322, 321 ],[ 279, 277, 250, 252 ],[ 294, 282, 278 ],[ 294, 286, 284 ],[ 325, 331, 329 ],[ 318, 305, 309 ],[ 318, 329, 304 ],[ 294, 278, 281 ],[ 329, 318, 325 ],[ 306, 310, 271, 269 ],[ 294, 284, 282 ],[ 327, 320, 322 ]]);
polyhedron(points,faces=[[ 200, 191, 199 ],[ 202, 205, 209, 213, 212, 223, 229, 228, 222, 217, 196, 193, 184, 175, 173, 153, 149, 144, 145, 150, 161, 162, 165, 169, 171 ],[ 206, 207, 199 ],[ 221, 227, 229, 223 ],[ 166, 157, 152, 172, 181 ],[ 225, 206, 218 ],[ 155, 158, 159, 148, 141 ],[ 148, 159, 161, 150 ],[ 224, 227, 221 ],[ 142, 143, 145, 144 ],[ 224, 226, 227 ],[ 163, 160, 159 ],[ 158, 163, 159 ],[ 152, 147, 149, 153 ],[ 215, 219, 221, 210, 207 ],[ 180, 181, 198 ],[ 141, 143, 142 ],[ 201, 204, 205, 202 ],[ 210, 221, 223, 212 ],[ 199, 167, 206 ],[ 208, 211, 213, 209 ],[ 204, 208, 209, 205 ],[ 197, 203, 198 ],[ 220, 216, 217, 222 ],[ 207, 208, 204 ],[ 224, 216, 220 ],[ 156, 151, 167 ],[ 198, 181, 197 ],[ 164, 168, 169, 165 ],[ 200, 207, 201 ],[ 163, 164, 160 ],[ 203, 197, 195, 216, 224 ],[ 160, 164, 165, 162 ],[ 163, 170, 168 ],[ 159, 160, 162, 161 ],[ 163, 167, 191 ],[ 181, 182, 192 ],[ 191, 167, 199 ],[ 195, 192, 193, 196 ],[ 199, 207, 200 ],[ 172, 152, 153, 173 ],[ 158, 155, 156 ],[ 141, 142, 147 ],[ 167, 163, 156 ],[ 157, 166, 154 ],[ 227, 226, 228, 229 ],[ 218, 224, 225 ],[ 207, 211, 208 ],[ 157, 141, 152 ],[ 203, 218, 198 ],[ 191, 200, 201, 170, 163 ],[ 207, 210, 211 ],[ 174, 172, 173, 175 ],[ 181, 174, 182 ],[ 168, 170, 171, 169 ],[ 154, 180, 151 ],[ 154, 141, 157 ],[ 141, 148, 143 ],[ 182, 174, 175, 184 ],[ 170, 201, 202, 171 ],[ 226, 220, 222, 228 ],[ 181, 192, 195 ],[ 211, 210, 212, 213 ],[ 218, 206, 167, 151, 180 ],[ 147, 142, 144, 149 ],[ 143, 148, 150, 145 ],[ 166, 180, 154 ],[ 219, 215, 225 ],[ 215, 206, 225 ],[ 141, 147, 152 ],[ 197, 181, 195 ],[ 224, 218, 203 ],[ 219, 224, 221 ],[ 225, 224, 219 ],[ 192, 182, 184, 193 ],[ 163, 168, 164 ],[ 156, 163, 158 ],[ 181, 180, 166 ],[ 207, 206, 215 ],[ 224, 220, 226 ],[ 216, 195, 196, 217 ],[ 181, 172, 174 ],[ 141, 151, 155 ],[ 151, 141, 154 ],[ 198, 218, 180 ],[ 207, 204, 201 ],[ 155, 151, 156 ]]);
polyhedron(points,faces=[[ 3, 10, 16 ],[ 47, 51, 52, 50, 46 ],[ 19, 37, 34, 17 ],[ 13, 15, 0 ],[ 11, 12, 15, 31, 30 ],[ 24, 3, 20 ],[ 19, 35, 39, 47, 37 ],[ 47, 46, 36, 30, 31, 37 ],[ 25, 40, 38 ],[ 40, 41, 43 ],[ 4, 5, 0 ],[ 39, 42, 47 ],[ 40, 28, 41 ],[ 5, 17, 14 ],[ 38, 5, 25 ],[ 41, 28, 21, 36, 46 ],[ 7, 14, 32, 27 ],[ 3, 18, 20 ],[ 5, 7, 13 ],[ 5, 14, 7 ],[ 36, 33, 29, 26, 30 ],[ 31, 27, 32, 34, 37 ],[ 21, 18, 36 ],[ 18, 16, 33, 36 ],[ 44, 45, 52, 51 ],[ 35, 38, 39 ],[ 5, 19, 17 ],[ 15, 13, 31 ],[ 5, 38, 35 ],[ 10, 6, 26, 29 ],[ 20, 40, 24 ],[ 40, 45, 44 ],[ 11, 30, 26, 6 ],[ 5, 13, 0 ],[ 3, 16, 18 ],[ 14, 17, 34, 32 ],[ 42, 39, 38 ],[ 40, 43, 45 ],[ 40, 42, 38 ],[ 12, 0, 15 ],[ 13, 7, 27, 31 ],[ 3, 12, 11 ],[ 16, 10, 29, 33 ],[ 5, 4, 3, 24, 40, 25 ],[ 0, 3, 4 ],[ 5, 35, 19 ],[ 3, 6, 10 ],[ 45, 43, 50, 52 ],[ 28, 20, 21 ],[ 3, 0, 12 ],[ 40, 20, 28 ],[ 3, 11, 6 ],[ 42, 44, 51, 47 ],[ 40, 44, 42 ],[ 18, 21, 20 ],[ 41, 46, 50, 43 ]]);
polyhedron(points,faces=[[ 106, 94, 97 ],[ 109, 139, 120 ],[ 139, 129, 130 ],[ 119, 116, 115 ],[ 106, 97, 98 ],[ 128, 114, 105, 84, 99 ],[ 121, 130, 122 ],[ 98, 97, 83, 84 ],[ 103, 106, 113 ],[ 116, 121, 122, 100, 90 ],[ 139, 128, 131 ],[ 139, 114, 128 ],[ 86, 90, 100, 99, 84, 82 ],[ 106, 103, 101 ],[ 114, 109, 105 ],[ 106, 98, 109 ],[ 120, 106, 109 ],[ 101, 103, 102 ],[ 86, 85, 88, 89, 90 ],[ 122, 129, 100 ],[ 106, 120, 139, 127, 119, 113 ],[ 130, 119, 127 ],[ 139, 131, 133 ],[ 105, 98, 84 ],[ 116, 90, 89, 115 ],[ 98, 105, 109 ],[ 106, 101, 96 ],[ 96, 101, 102, 86, 82 ],[ 119, 110, 111 ],[ 132, 133, 108, 107 ],[ 139, 133, 132 ],[ 129, 122, 130 ],[ 111, 102, 103 ],[ 106, 93, 94 ],[ 128, 99, 104, 131 ],[ 111, 110, 85, 86 ],[ 110, 112, 88, 85 ],[ 113, 119, 103 ],[ 119, 130, 121 ],[ 97, 94, 80, 83 ],[ 139, 132, 129 ],[ 96, 82, 79, 93 ],[ 139, 109, 114 ],[ 94, 93, 79, 80 ],[ 133, 131, 104, 108 ],[ 129, 132, 107, 100 ],[ 106, 96, 93 ],[ 119, 121, 116 ],[ 127, 139, 130 ],[ 100, 107, 108, 104, 99 ],[ 102, 111, 86 ],[ 112, 115, 89, 88 ],[ 119, 115, 112 ],[ 119, 111, 103 ],[ 84, 83, 80, 79, 82 ],[ 119, 112, 110 ]]);
    }
    render() {
polyhedron(points,faces=[[ 243, 62, 49, 232 ],[ 241, 247, 243, 232 ],[ 246, 240, 231, 242 ],[ 231, 53, 63, 242 ],[ 63, 53, 49, 62 ],[ 333, 301, 240, 246 ],[ 240, 231, 53, 49, 232, 241, 290, 301 ],[ 290, 301, 333, 332 ],[ 246, 242, 63, 62, 243, 247, 332, 333 ],[ 247, 241, 290, 332 ]]);
polyhedron(points,faces=[[ 138, 56, 60, 146 ],[ 2, 23, 60, 56 ],[ 23, 2, 78, 87 ],[ 138, 78, 2, 56 ],[ 78, 138, 146, 87 ],[ 60, 23, 87, 146 ]]);
polyhedron(points,faces=[[ 22, 71, 70, 1 ],[ 59, 74, 71, 22 ],[ 59, 22, 1, 57 ],[ 73, 70, 71, 74 ],[ 57, 73, 74, 59 ],[ 1, 70, 73, 57 ]]);
polyhedron(points,faces=[[ 194, 77, 75, 135 ],[ 72, 75, 77, 76 ],[ 91, 72, 76, 137 ],[ 137, 76, 77, 194 ],[ 137, 194, 135, 91 ],[ 135, 75, 72, 91 ]]);
    }
}
